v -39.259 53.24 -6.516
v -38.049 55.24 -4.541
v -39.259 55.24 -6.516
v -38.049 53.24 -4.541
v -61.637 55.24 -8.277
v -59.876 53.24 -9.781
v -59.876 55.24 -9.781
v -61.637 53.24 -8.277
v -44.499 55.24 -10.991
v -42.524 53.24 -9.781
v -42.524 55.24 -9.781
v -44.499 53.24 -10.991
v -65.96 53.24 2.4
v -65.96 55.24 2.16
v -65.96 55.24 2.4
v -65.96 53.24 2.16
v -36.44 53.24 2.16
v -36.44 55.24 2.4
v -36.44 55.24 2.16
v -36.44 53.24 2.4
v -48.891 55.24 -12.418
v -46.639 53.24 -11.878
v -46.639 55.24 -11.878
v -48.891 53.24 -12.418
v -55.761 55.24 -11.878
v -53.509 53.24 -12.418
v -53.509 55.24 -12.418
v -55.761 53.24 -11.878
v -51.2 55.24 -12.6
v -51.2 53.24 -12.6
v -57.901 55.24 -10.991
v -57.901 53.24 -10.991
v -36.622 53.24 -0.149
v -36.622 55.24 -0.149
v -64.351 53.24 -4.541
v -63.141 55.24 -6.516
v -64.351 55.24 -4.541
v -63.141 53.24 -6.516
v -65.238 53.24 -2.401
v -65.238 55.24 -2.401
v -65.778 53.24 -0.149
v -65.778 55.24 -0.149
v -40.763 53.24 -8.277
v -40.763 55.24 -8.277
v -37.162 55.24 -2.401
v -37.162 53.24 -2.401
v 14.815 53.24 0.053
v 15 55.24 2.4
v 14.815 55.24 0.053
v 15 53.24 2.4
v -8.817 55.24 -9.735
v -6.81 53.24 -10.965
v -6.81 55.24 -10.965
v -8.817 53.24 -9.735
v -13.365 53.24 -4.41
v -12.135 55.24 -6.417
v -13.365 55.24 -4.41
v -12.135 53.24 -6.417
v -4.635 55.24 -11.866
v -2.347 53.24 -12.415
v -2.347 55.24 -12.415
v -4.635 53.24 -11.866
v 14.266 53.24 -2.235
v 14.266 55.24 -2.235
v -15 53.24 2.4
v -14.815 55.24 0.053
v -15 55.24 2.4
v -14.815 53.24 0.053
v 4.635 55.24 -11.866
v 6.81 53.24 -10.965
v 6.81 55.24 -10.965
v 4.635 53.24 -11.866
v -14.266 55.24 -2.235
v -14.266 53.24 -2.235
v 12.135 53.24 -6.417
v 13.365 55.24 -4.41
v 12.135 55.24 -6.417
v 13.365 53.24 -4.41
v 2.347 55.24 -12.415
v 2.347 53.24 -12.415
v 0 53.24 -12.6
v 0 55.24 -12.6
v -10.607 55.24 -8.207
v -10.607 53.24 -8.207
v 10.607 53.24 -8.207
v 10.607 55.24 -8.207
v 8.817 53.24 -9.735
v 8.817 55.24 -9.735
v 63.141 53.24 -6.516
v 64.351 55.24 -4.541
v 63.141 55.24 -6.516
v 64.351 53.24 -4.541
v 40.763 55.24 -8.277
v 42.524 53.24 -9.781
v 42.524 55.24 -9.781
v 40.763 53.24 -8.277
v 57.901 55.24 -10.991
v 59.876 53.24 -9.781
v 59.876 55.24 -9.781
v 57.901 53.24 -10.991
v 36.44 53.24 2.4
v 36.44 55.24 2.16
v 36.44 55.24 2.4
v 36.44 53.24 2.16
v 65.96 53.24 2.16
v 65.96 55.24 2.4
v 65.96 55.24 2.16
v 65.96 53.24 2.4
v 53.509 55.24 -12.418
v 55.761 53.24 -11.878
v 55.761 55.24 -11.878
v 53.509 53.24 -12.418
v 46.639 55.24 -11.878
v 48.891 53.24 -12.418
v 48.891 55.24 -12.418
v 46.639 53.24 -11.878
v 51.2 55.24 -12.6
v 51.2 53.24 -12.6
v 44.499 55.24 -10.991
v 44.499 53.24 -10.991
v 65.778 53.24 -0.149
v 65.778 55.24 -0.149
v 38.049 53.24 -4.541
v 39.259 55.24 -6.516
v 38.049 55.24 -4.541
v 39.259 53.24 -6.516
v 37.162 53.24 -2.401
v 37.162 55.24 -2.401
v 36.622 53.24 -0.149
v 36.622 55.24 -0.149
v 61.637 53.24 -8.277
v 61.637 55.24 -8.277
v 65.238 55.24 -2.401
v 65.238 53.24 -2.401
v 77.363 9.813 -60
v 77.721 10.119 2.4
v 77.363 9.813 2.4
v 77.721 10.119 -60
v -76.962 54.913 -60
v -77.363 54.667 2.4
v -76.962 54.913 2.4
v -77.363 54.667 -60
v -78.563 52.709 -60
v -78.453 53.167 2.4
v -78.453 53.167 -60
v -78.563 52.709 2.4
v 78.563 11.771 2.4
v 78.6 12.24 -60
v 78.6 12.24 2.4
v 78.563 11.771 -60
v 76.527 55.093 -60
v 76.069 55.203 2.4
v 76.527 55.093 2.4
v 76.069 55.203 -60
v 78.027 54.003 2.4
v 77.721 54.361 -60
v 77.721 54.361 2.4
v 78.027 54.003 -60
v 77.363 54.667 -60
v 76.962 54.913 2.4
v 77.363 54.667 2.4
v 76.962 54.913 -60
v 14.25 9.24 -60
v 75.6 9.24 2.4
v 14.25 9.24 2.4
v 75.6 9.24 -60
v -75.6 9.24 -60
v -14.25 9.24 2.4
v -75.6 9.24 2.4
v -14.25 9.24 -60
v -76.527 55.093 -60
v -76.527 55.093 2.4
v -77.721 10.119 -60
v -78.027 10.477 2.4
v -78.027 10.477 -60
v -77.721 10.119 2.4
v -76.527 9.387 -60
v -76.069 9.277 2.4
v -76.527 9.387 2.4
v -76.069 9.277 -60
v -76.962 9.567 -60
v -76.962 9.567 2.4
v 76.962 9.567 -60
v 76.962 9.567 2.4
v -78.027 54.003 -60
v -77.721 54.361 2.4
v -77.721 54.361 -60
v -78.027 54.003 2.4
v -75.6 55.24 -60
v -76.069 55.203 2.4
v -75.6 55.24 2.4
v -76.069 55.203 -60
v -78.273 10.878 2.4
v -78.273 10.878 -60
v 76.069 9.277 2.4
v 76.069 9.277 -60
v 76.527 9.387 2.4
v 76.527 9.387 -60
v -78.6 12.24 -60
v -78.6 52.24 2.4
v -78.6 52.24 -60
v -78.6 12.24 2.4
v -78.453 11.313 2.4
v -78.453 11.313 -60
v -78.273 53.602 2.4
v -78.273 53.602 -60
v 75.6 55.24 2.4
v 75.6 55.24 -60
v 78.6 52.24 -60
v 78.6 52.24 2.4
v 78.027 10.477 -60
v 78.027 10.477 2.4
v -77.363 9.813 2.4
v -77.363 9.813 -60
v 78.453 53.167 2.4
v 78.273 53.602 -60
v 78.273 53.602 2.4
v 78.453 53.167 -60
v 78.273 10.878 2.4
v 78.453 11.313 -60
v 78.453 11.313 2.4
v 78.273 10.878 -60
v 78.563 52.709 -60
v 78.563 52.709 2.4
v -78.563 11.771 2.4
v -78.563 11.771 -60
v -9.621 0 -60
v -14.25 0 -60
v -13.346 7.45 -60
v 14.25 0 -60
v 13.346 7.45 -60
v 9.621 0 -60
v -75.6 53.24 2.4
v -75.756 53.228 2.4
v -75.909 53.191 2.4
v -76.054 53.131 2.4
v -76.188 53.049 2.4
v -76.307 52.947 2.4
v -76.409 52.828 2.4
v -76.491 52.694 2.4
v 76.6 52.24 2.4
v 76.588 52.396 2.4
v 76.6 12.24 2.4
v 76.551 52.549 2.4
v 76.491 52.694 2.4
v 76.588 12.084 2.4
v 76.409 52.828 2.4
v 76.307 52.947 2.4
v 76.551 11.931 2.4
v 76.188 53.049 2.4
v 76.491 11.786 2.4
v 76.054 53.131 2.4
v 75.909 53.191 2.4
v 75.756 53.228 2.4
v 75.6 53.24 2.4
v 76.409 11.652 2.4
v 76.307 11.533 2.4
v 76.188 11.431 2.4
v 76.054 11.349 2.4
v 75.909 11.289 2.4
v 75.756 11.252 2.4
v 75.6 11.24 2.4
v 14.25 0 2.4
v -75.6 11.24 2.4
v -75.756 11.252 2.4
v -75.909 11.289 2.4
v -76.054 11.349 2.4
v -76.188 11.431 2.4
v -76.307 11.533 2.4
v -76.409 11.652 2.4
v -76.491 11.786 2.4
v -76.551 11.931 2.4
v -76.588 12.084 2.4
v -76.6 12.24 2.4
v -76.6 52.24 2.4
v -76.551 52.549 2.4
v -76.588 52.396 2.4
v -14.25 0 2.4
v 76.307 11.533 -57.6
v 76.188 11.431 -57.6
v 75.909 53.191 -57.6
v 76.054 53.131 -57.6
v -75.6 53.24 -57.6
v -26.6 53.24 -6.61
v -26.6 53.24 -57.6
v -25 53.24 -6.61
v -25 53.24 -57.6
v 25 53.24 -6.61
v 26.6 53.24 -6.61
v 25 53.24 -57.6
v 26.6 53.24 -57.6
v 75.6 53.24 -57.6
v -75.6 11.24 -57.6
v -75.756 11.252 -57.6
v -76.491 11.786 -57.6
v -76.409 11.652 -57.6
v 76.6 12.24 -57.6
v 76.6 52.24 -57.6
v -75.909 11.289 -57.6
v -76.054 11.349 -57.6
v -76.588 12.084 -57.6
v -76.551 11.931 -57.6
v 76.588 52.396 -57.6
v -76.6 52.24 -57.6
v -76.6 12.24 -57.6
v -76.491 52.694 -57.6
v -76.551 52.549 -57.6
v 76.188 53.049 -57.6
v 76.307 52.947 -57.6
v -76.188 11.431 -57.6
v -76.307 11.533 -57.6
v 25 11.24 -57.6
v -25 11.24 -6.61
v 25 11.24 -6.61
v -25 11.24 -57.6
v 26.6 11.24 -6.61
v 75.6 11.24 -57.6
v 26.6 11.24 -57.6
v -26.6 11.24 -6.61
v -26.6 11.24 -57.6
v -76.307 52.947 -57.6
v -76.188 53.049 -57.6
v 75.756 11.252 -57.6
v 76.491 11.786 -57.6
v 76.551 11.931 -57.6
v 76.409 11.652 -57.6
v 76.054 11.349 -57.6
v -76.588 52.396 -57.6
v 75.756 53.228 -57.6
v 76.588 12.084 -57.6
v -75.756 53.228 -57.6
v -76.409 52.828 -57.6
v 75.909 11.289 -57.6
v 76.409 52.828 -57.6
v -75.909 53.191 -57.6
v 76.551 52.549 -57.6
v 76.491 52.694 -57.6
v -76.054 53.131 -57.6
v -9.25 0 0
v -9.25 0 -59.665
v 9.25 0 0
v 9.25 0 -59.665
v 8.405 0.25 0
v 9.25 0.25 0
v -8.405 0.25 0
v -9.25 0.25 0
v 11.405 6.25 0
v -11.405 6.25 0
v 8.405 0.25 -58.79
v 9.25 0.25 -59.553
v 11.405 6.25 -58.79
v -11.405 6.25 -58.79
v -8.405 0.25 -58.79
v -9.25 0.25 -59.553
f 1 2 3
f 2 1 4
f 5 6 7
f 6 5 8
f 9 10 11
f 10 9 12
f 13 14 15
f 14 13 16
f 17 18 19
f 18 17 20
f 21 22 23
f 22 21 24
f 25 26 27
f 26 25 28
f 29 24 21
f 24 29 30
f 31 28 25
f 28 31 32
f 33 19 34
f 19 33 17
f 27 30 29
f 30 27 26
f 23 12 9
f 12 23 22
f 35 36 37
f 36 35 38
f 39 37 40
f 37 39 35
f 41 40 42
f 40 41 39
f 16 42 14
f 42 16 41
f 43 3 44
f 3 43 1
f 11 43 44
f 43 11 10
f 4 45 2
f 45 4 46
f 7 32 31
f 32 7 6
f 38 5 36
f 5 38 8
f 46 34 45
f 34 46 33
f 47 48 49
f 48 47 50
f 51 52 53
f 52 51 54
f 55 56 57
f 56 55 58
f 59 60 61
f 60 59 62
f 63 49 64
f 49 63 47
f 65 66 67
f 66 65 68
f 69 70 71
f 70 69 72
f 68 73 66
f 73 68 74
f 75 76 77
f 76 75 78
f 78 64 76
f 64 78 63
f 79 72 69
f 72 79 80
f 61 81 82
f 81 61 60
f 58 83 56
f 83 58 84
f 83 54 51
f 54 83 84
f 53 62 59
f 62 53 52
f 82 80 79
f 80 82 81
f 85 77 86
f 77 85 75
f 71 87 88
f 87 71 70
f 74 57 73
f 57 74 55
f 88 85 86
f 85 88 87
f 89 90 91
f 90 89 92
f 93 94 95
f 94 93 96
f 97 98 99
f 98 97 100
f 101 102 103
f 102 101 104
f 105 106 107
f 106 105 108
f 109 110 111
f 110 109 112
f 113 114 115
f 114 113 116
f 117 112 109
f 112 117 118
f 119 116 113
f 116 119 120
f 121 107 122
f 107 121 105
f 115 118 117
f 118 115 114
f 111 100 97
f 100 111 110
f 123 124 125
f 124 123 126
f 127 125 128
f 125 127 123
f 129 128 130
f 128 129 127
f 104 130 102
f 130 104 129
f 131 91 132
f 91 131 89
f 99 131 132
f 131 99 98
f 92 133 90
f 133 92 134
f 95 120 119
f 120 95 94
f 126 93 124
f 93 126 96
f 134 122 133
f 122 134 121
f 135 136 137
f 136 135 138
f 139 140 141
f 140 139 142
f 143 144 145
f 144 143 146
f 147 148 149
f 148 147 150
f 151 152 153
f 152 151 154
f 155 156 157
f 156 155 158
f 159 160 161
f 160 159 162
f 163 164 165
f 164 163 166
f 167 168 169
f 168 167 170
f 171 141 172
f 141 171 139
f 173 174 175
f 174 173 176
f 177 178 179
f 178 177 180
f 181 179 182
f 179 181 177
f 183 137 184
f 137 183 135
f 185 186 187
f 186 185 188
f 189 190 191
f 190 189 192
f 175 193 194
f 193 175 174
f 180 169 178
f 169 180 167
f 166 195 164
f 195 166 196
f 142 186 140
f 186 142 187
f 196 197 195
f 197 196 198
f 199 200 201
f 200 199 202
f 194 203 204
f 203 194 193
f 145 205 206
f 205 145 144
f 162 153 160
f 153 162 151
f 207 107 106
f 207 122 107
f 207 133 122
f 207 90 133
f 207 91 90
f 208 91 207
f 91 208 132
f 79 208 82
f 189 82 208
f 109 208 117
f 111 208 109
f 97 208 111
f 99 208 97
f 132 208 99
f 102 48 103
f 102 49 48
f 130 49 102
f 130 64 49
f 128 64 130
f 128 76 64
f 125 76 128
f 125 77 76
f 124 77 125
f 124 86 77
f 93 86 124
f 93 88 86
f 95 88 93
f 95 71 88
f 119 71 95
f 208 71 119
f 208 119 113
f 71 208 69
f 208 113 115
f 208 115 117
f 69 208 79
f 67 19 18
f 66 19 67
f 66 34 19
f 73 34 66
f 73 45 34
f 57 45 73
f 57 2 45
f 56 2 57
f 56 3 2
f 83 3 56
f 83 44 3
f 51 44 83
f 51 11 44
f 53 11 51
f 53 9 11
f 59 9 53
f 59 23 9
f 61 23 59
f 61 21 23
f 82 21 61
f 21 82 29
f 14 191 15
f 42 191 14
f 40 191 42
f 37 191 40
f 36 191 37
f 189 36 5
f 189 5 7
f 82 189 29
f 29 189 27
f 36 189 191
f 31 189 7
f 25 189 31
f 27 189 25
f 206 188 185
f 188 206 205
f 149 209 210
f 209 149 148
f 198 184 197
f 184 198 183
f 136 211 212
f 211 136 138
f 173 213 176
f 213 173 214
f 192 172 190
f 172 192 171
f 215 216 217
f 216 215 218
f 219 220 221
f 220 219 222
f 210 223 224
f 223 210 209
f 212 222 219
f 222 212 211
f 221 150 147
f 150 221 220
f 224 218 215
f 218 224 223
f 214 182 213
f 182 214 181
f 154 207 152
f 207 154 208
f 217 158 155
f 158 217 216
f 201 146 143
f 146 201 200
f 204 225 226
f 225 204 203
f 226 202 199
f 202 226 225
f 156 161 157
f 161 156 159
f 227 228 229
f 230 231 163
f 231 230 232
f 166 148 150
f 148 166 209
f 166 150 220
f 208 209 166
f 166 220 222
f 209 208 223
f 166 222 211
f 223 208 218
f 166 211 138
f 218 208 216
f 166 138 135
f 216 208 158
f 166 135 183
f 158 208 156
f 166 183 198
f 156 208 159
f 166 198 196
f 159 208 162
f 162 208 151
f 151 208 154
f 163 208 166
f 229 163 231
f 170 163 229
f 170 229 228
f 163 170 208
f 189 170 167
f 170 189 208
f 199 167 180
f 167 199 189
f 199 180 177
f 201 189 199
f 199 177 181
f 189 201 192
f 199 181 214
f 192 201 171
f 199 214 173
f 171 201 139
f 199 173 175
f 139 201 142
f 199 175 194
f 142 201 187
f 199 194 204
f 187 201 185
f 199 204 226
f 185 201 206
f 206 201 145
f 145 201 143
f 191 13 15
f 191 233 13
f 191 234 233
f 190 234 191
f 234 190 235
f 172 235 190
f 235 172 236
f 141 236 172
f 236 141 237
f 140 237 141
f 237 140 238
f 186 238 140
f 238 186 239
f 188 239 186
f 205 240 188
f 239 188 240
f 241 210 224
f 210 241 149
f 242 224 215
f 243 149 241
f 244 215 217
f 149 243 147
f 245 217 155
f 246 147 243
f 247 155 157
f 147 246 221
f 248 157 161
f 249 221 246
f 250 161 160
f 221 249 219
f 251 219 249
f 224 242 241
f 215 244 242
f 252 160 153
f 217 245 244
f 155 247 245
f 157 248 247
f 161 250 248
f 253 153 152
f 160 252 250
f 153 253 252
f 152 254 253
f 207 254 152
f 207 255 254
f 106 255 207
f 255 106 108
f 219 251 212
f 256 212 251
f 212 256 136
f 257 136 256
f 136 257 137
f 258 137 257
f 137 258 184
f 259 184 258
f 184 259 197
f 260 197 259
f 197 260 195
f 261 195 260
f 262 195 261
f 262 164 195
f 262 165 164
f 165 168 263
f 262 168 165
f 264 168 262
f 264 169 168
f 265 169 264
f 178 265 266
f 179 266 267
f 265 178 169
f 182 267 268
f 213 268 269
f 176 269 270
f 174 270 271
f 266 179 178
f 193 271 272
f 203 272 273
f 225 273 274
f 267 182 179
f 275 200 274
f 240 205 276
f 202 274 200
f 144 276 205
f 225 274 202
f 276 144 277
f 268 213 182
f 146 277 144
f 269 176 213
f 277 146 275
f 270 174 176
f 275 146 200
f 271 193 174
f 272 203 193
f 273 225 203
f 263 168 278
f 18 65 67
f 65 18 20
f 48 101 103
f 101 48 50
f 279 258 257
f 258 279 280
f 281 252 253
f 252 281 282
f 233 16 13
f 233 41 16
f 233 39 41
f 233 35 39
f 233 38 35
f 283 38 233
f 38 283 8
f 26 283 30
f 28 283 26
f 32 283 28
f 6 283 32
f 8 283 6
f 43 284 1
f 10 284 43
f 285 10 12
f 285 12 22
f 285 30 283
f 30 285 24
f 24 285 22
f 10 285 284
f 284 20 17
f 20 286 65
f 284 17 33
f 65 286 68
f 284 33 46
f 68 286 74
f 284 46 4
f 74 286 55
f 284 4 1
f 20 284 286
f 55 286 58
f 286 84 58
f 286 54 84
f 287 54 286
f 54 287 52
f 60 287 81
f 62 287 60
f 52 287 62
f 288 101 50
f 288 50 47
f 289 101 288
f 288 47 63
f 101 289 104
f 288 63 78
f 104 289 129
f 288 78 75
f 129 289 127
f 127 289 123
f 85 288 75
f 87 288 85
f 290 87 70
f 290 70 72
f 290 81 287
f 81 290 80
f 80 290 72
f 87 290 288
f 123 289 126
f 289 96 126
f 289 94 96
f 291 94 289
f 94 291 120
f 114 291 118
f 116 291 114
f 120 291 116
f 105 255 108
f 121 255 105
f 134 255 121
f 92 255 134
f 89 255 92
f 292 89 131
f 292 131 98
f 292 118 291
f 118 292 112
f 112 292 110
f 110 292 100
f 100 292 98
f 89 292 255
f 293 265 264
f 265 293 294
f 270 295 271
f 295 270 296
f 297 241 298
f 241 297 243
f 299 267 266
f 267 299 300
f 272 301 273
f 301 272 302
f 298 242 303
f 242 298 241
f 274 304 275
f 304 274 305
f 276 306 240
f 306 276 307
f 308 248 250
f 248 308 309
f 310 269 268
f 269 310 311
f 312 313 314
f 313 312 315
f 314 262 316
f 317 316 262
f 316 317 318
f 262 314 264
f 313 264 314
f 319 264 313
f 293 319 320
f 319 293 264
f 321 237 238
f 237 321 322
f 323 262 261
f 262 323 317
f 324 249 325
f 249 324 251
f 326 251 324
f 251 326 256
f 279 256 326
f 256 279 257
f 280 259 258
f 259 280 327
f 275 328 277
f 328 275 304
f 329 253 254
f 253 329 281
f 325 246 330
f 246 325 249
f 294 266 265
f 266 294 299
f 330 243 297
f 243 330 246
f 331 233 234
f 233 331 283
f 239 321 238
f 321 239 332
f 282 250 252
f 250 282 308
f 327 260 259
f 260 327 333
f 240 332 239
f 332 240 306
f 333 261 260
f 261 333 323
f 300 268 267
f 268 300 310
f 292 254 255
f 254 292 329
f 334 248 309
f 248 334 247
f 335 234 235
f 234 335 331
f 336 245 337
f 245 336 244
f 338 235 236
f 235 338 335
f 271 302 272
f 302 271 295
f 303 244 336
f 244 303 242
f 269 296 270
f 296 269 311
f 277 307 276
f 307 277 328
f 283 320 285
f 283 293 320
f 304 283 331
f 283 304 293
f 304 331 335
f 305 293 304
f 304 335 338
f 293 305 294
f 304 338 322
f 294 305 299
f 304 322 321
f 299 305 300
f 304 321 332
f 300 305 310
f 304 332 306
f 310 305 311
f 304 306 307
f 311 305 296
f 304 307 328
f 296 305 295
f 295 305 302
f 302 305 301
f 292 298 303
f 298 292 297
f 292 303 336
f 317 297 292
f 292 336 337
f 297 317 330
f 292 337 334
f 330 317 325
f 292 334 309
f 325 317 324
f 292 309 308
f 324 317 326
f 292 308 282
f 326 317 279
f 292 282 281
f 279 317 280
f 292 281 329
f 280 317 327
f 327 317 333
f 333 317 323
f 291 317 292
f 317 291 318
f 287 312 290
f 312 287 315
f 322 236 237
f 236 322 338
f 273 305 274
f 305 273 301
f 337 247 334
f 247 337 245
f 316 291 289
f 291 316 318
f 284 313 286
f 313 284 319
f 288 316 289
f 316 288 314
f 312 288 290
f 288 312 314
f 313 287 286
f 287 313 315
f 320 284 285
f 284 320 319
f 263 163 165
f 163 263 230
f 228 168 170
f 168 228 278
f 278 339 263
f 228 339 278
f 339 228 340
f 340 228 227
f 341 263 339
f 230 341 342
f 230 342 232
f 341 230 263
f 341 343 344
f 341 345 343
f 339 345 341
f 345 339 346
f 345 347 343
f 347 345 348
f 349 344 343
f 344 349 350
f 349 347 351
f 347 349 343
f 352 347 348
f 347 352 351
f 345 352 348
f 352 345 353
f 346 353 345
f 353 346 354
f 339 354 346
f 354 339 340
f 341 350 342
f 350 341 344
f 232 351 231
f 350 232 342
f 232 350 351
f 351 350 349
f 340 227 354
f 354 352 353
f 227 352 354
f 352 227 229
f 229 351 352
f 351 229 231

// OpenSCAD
// file: rail-clip.scad
// Bunk rail system, shared library.
//
// A rail clip hooks over a bed's top guardrail rail. Its plate carries a
// vertical dovetail tail; every accessory (cup, tissue box, cubby, and
// later a wardrobe rod or hooks) has a matching socket on its back. The
// socket is open at the bottom and capped by a roof at the top: you lower
// the accessory from above, the tail enters through the socket's bottom
// mouth, and the roof comes down onto the tail's top end. Weight and a
// dropped cup push the roof harder onto the tail, so a load can't slide
// the accessory off; only lifting it does. Wide accessories take two or
// more clips.
//
// (Before 2026-11-12 the stop was a floor at the socket's bottom, which
// meant the accessory went on by being pushed UP and any downward load
// slid it off. pipeline/print-check's retention check now fails that.)
//
// Defaults are the owner's caliper readings (2026-11-08) of a Bellemave
// twin low loft (FST00301-TB-AH): top rail 20.74 front-to-back x 20.38
// tall, lower rails about 15.5 tall x 20.18, 80.54 from the top rail's
// bottom to the next rail's top. The owner reports the rails are 80 apart
// all the way down.
//
// Clip axes: X runs along the rail, Y points away from the rail toward
// the accessory, Z is up. The top rail's bottom face is z = 0 and its
// accessory-side face is y = 0. Inside or outside the bed is the same
// part turned the other way round.
//
// Accessory axes: X along the rail, Y away from the clip, Z up. The
// accessory's back face is y = 0 and the underside of the socket roof
// (where the tail's top end bears) is z = 0. The roof is z = 0 to
// dt_roof(); the accessory hangs below.

// ---- dovetail interface (keep these fixed so all parts interchange) ----
function dt_base() = 16;    // tail width at the plate
function dt_tip() = 22;     // tail width at its face
function dt_depth() = 6;    // how far the tail stands off the plate
function dt_wall() = 3;     // accessory material around the socket
function dt_roof() = 2.4;   // socket roof over the tail's top end; carries the load
function dt_block_w(c) = dt_tip() + 2 * c + 2 * dt_wall();
function dt_block_d(c) = dt_depth() + c + dt_wall();

module dt_profile() {
  polygon([[-dt_base() / 2, 0], [dt_base() / 2, 0],
           [dt_tip() / 2, dt_depth()], [-dt_tip() / 2, dt_depth()]]);
}

// male tail on the clip, standing on y = 0, from z0 to z1
module dt_tail(z0, z1) {
  translate([0, 0, z0]) linear_extrude(z1 - z0) dt_profile();
}

// socket cut, clearance c on every mating face, open through y < 0
module dt_socket(z0, z1, c) {
  translate([0, 0, z0]) linear_extrude(z1 - z0) union() {
    offset(delta = c) dt_profile();
    translate([-dt_base() / 2 - c - 1, -1]) square([dt_base() + 2 * c + 2, 1 + c]);
  }
}

// Give an accessory its mount block(s) and socket(s). Children are the
// accessory body, starting at y = dt_block_d(c). The block runs from
// z = -h up to the roof's top (dt_roof()); its socket is open at the
// bottom and stops at the roof. h is how much tail the socket takes; a
// longer tail just shows below the block. xs are the socket centers along
// X (a clip each).
module with_mounts(h, c = 0.25, xs = [0]) {
  bw = dt_block_w(c);
  bd = dt_block_d(c);
  assert(h >= 30, str("with_mounts: only ", h, " mm of tail engaged; 30 is the minimum"));
  difference() {
    union() {
      children();
      for (x = xs) translate([x - bw / 2, 0, -h]) cube([bw, bd + 0.01, h + dt_roof()]);
    }
    for (x = xs) translate([x, 0, 0]) dt_socket(-h - 1, 0, c);
    // 45 deg lead-in chamfer at each socket's bottom mouth
    for (x = xs) translate([x, 0, 0]) hull() {
      translate([0, 0, -h - 0.01]) linear_extrude(0.01) offset(delta = c + 1.2) dt_profile();
      translate([0, 0, -h + 1.2]) linear_extrude(0.01) offset(delta = c) dt_profile();
    }
  }
}

// ---- clip ----
function clip_top(rail_h = 20.38, wall = 3) = rail_h + wall;
function clip_foot(rail_gap = 80.54, brace = 7.5) = -(rail_gap + brace);
function clip_mount_y(clear = 0.4, wall = 3) = clear / 2 + wall;

module rail_clip(rail_d = 20.74, rail_h = 20.38, rail_gap = 80.54,
                 hook_w = 40, wall = 3, leg_t = 2.5, lip = 1.0, lip_h = 2.5,
                 brace = 7.5, clear = 0.4, eps = 0.01,
                 catch = "none", low_h = 15.42, low_d = 15.42, low_set = 2.47, pad_clear = 0.3,
                 catch_clear = 0.6, catch_reach = 1.5, catch_t = 2.5,
                 nub_h = 2, nub_t = 2.5, wrap = false, min_tail = 34) {
  // The clip hangs from one rail (rail_d x rail_h) and catches the next one
  // down (low_d x low_h, rail_gap below, its near face low_set behind this
  // rail's; negative low_set = in front of it). wrap = true: a clip for a
  // single bar; the J catches under the same bar it hangs from, and a short
  // far lip replaces the far leg so it rocks on.
  g  = wrap ? -rail_h : rail_gap;
  lh = wrap ? rail_h : low_h;
  ld = wrap ? rail_d : low_d;
  ls = wrap ? 0 : low_set;
  top_z = clip_top(rail_h, wall);
  foot_z = clip_foot(g, brace);
  near_y = clear / 2;
  far_y = -(rail_d + clear / 2);
  low_face = -ls;                                // next rail's near face
  // the plate stands off whichever face sticks out further
  plate_y = wrap ? near_y : max(near_y, low_face + pad_clear);
  // catch = "hook": a lip snaps under the next rail's near edge; flat top
  // face holds, 45 deg ramp underneath so the plate flexes over the rails.
  // Printed saddle-down the flat face is a ledge over air of about
  // catch_reach (1.5 = owner's pick, 2026-11-16).
  catch_z = -(g + lh) - catch_clear;             // underside of the next rail, plus play
  tip_y = low_face - catch_reach;
  ramp = plate_y - tip_y;
  // catch = "j" (owner's pick, 2026-11-18): a shelf runs right under the
  // next rail, across its full depth, and a nub_h nub turns up behind its
  // far face. It goes on by hooking under first and rocking up over the
  // hanging rail. Printed saddle-down, shelf and nub need supports.
  j_far = low_face - ld - catch_clear;           // shelf's far end, behind the next rail
  catch_bot = catch == "hook" ? catch_z - catch_t - ramp
            : catch == "j" ? catch_z - catch_t - 4 : foot_z;
  // long enough for an accessory's 30 mm of socket, whatever the catch
  plate_z = min(catch_bot, top_z - min_tail);
  assert(catch == "none" || catch == "hook" || catch == "j", str("rail_clip: unknown catch ", catch));
  assert(!wrap || catch == "j", "rail_clip: a single-bar clip (wrap) needs catch = \"j\"");
  // spacer between the plate and this rail's face, when the next rail sticks out further
  if (plate_y > near_y + 0.2) translate([-hook_w / 2, near_y - eps, 0]) cube([hook_w, plate_y - near_y + 2 * eps, rail_h + eps]);
  // pad on the plate's inside that rests on the next rail's face (pad_clear
  // play) when that rail sits behind this one. 45 deg ends.
  pad = plate_y - (low_face + pad_clear);
  if (!wrap && pad > 0.2) translate([hook_w / 2, 0, 0]) rotate([0, -90, 0]) linear_extrude(hook_w)
    // with a catch the pad runs on down into it (no notch for a ledge to hang off)
    let(pb = catch == "none" ? max(-(g + lh), plate_z + pad) : catch_z - eps)
    polygon([[-g + pad, plate_y + eps], [-g, plate_y - pad], [pb, plate_y - pad],
             catch == "none" ? [pb - pad, plate_y + eps] : [pb, plate_y + eps]]);
  translate([-hook_w / 2, plate_y, plate_z]) cube([hook_w, wall, top_z - plate_z]);
  if (catch == "hook") translate([hook_w / 2, 0, 0]) rotate([0, -90, 0]) linear_extrude(hook_w)
    polygon([[catch_z, plate_y + eps], [catch_z, tip_y], [catch_z - catch_t, tip_y],
             [catch_z - catch_t - ramp, plate_y + eps]]);
  if (catch == "j") translate([hook_w / 2, 0, 0]) rotate([0, -90, 0]) linear_extrude(hook_w) union() {
    // shelf under the next rail, from the plate to behind its far face
    polygon([[catch_z, plate_y + eps], [catch_z, j_far - nub_t],
             [catch_z - catch_t, j_far - nub_t], [catch_z - catch_t, plate_y + eps]]);
    // nub up behind the far face, 45 deg lead-in on its outer top edge
    polygon([[catch_z - eps, j_far], [catch_z + nub_h, j_far],
             [catch_z + nub_h, j_far - nub_t + min(nub_h, nub_t) / 2], [catch_z + nub_h - min(nub_h, nub_t) / 2, j_far - nub_t],
             [catch_z - eps, j_far - nub_t]]);
    // 45 deg gusset under the shelf where it meets the plate
    polygon([[catch_z - catch_t + eps, plate_y + eps], [catch_z - catch_t + eps, plate_y - 4],
             [catch_z - catch_t - 4, plate_y + eps]]);
  }
  // saddle across the rail top
  translate([-hook_w / 2, far_y - leg_t, rail_h])
    cube([hook_w, plate_y - far_y + wall + leg_t, wall]);
  if (wrap) {
    // short far lip over the bar's far top edge (the J holds the bottom)
    translate([-hook_w / 2, far_y - leg_t, rail_h - nub_h - 1]) cube([hook_w, leg_t, nub_h + 1 + eps]);
  } else {
    // far leg down the rail's far face
    translate([-hook_w / 2, far_y - leg_t, -lip_h]) cube([hook_w, leg_t, rail_h + lip_h + eps]);
    // snap lip under the rail's far edge, lead-in chamfer on its lower face
    translate([hook_w / 2, far_y, -lip_h]) rotate([0, -90, 0]) linear_extrude(hook_w)
      polygon([[0, 0], [lip_h, 0], [lip_h, lip], [lip_h - lip, lip]]);
  }
  // dovetail tail on the plate's outer face, to the plate's bottom so a
  // catch has no thin neck (accessories just leave it showing below)
  translate([0, plate_y + wall - eps, 0]) dt_tail(plate_z, top_z);
}

// place an accessory (in accessory axes) on a default clip at x
module on_clip(x = 0, clear = 0.4, wall = 3, rail_h = 20.38) {
  translate([x, clip_mount_y(clear, wall), clip_top(rail_h, wall)])
    children();
}

// the bed's rails, for renders only (accessory side is +Y)
// next rail: 15.42 square, its near face 2.47 behind the top rail's (owner's calipers, 2026-11-16)
module rail_ghost(rail_d = 20.74, rail_h = 20.38, rail_gap = 80.54, low_d = 15.42, low_h = 15.42, low_set = 2.47) {
  color("pink", 0.5) {
    translate([-200, -rail_d, 0]) cube([400, rail_d, rail_h]);
    translate([-200, -low_set - low_d, -rail_gap - low_h]) cube([400, low_d, low_h]);
  }
}

// assembly preview: rails, clips at xs, accessory. The clip is the same
// part inside or outside the bed; it just goes on the other way round.
module bunk_assembly(xs = [0]) {
  rail_ghost();
  for (x = xs) color("orchid") translate([x, 0, 0]) rail_clip();
  color("plum") on_clip() children();
}

// pieces of the assembly one at a time, for the print-check tool
module bunk_piece(which, xs = [0]) {
  if (which == "rails") rail_ghost();
  else if (which == "clips") for (x = xs) translate([x, 0, 0]) rail_clip();
  else if (which == "mounted") on_clip() children();
}
// main file
// Bunk storage tray: an open-top rectangular tray with compartments that
// hangs on rail clips (clip.scad), lowered on from above. Remotes, glasses,
// books, toys: pick a size preset, or set "custom" and give every column
// width and row depth yourself.
//
//   small: 3 compartments in a row, 1 clip
//   large: 3 x 2 = 6 compartments, 2 clips
//
// Each compartment is sized for a TV remote standing up (most are about
// 40-50 mm wide and 20-25 mm thick). Columns run along the rail; rows run
// away from it, row 1 nearest the rail.
//
// Layout style:
//   grid:    even columns x rows (col_w / row_d)
//   feature: one big middle compartment with small ones at the sides
//            (small: narrow | wide | narrow; large: big middle, 2 small
//            stacked each side)
//   lines:   draw your own. Each line is one divider wall, [x1, y1, x2, y2]
//            in mm on the tray's inside floor, as seen standing in the room
//            facing the bed: x from the left wall (0) to the right wall, y from the rail-side wall (0) to the front
//            wall. Lines run straight across (x1 == x2 or y1 == y2), and
//            each end must land on a wall or on another line, like drawing
//            wall to wall. This is what the shop's draw-your-own editor sends.
//
// Print upright as modeled, no supports: the floor sits on the bed and the
// finger scoops are open at the top.

use <rail-clip.scad>

size = "small"; // [small, large, custom]
style = "grid";  // [grid, feature, lines]
lines = [[60, 0, 60, 40], [0, 20, 60, 20]]; // style = lines: [x1, y1, x2, y2] in mm

/* [Custom compartments (size = custom)] */
col_w = [50, 50, 50]; // each column's inside width, along the rail
row_d = [42];         // each row's inside depth, away from the rail
height = 60;          // wall height above the floor
clips = 1;            // 1 or 2 rail clips
clip_pitch = 120;     // clip spacing when using 2; must miss the bed's posts

/* [Build] */
wall = 2;
divider = 1.6;        // divider thickness
divider_frac = 0.85;  // divider height as a fraction of the wall height
floor_t = 2.4;
corner_r = 3;
scoop = 15;           // finger dip in the front wall of each column (0 for none)
scoop_frac = 0.6;     // dip width as a fraction of the column width

/* [Fit] */
dt_clear = 0.25;

part = "tray"; // [tray, assembly, rails, clips, mounted]

/* [Hidden] */
$fn = 40;
eps = 0.01;

P = size == "small" ? [[50, 50, 50], [42], 60, 1, 120]
  : size == "large" ? [[55, 55, 55], [38, 38], 70, 2, 120]
  : [col_w, row_d, height, clips, clip_pitch];
cw = P[0]; rd = P[1]; ht = P[2]; nclips = P[3]; pitch = P[4];

function sum(v, n) = n <= 0 ? 0 : v[n - 1] + sum(v, n - 1);

assert(len(cw) >= 1 && len(rd) >= 1, "need at least one column and one row");
for (w = cw) assert(w >= 15, str("column width ", w, " is under 15 mm"));
for (d = rd) assert(d >= 15, str("row depth ", d, " is under 15 mm"));
assert(scoop < ht - 15, "scoop must leave at least 15 mm of front wall");

iw = sum(cw, len(cw)) + (len(cw) - 1) * divider;  // inside width
id = sum(rd, len(rd)) + (len(rd) - 1) * divider;  // inside depth
ow = iw + 2 * wall;
od = id + 2 * wall;
oh = floor_t + ht;
y0 = dt_block_d(dt_clear) - eps;
bot = dt_roof() - oh;  // rim flush with the socket roof
xs = nclips >= 2 ? [-pitch / 2, pitch / 2] : [0];
dh = ht * divider_frac;

// ---- dividers as lines (centerlines, inside-floor mm) ----
function cumsum(v, i) = i <= 0 ? 0 : v[i - 1] + cumsum(v, i - 1);
grid_lines = concat(
  [for (i = [1 : len(cw) - 1]) let(x = cumsum(cw, i) + (i - 0.5) * divider) [x, 0, x, id]],
  len(rd) > 1 ? [for (j = [1 : len(rd) - 1]) let(y = cumsum(rd, j) + (j - 0.5) * divider) [0, y, iw, y]] : []);
fs = len(rd) > 1;  // large-style: stack the side cells
side = min(48, iw * 0.28);
feature_lines = concat([[side, 0, side, id], [iw - side, 0, iw - side, id]],
  fs ? [[0, id / 2, side, id / 2], [iw - side, id / 2, iw, id / 2]] : []);
L = style == "grid" ? grid_lines : style == "feature" ? feature_lines : lines;

E = 0.01;
function on_seg(p, l) =  // point p on line l (within E)
  l[0] == l[2] ? (abs(p[0] - l[0]) < E + divider / 2 && p[1] >= min(l[1], l[3]) - E && p[1] <= max(l[1], l[3]) + E)
               : (abs(p[1] - l[1]) < E + divider / 2 && p[0] >= min(l[0], l[2]) - E && p[0] <= max(l[0], l[2]) + E);
function on_wall(p) = abs(p[0]) < E || abs(p[0] - iw) < E || abs(p[1]) < E || abs(p[1] - id) < E;
function anchored(p, k) = on_wall(p) || len([for (m = [0 : len(L) - 1]) if (m != k && on_seg(p, L[m])) 1]) > 0;

for (k = [0 : len(L) - 1]) let(l = L[k]) {
  assert(len(l) == 4, str("line ", k, " needs [x1, y1, x2, y2]"));
  assert(l[0] == l[2] || l[1] == l[3], str("line ", k, " must run straight across (x1 == x2 or y1 == y2)"));
  assert(min(l[0], l[2]) >= -E && max(l[0], l[2]) <= iw + E && min(l[1], l[3]) >= -E && max(l[1], l[3]) <= id + E,
         str("line ", k, " leaves the tray (inside is ", iw, " x ", id, " mm)"));
  assert(anchored([l[0], l[1]], k) && anchored([l[2], l[3]], k),
         str("line ", k, " must start and end on a wall or another line"));
}

// front-wall compartments: split the front wall at every line that reaches it
function qsort(v) = len(v) <= 1 ? v : let(p = v[0])
  concat(qsort([for (x = v) if (x < p) x]), [for (x = v) if (x == p) x], qsort([for (x = v) if (x > p) x]));
// model axes: the room-side viewer's left is +X, so flip x
G = [for (l = L) [iw - l[0], l[1], iw - l[2], l[3]]];
front_x = qsort(concat([0, iw], [for (l = G) if (l[0] == l[2] && max(l[1], l[3]) >= id - E) l[0]]));

echo(str("storage tray ", size, " / ", style, ": ", len(L), " dividers, inside ", iw, " x ", id,
         ", outside ", ow, " x ", od, " x ", oh, " mm, clips ", nclips));

module rbox(w, d, h, r) {
  hull() for (x = [r, w - r], y = [r, d - r]) translate([x, y, 0]) cylinder(r = r, h = h);
}

module body() {
  difference() {
    translate([-ow / 2, y0, bot]) rbox(ow, od, oh, corner_r);
    translate([-iw / 2, y0 + wall, bot + floor_t]) rbox(iw, id, oh, max(0.5, corner_r - wall));
    if (scoop > 0)
      for (i = [0 : len(front_x) - 2]) let(a = front_x[i], b = front_x[i + 1], cwid = b - a - divider)
        if (cwid >= 15) let(sw = cwid * scoop_frac)
          // round-bottomed dip in the front wall, open at the top
          translate([-iw / 2 + (a + b) / 2, y0 + od + 1, bot + oh - scoop + sw / 2]) rotate([90, 0, 0])
            hull() { cylinder(d = sw, h = wall + 2); translate([-sw / 2, 0, 0]) cube([sw, scoop + 1, wall + 2]); }
  }
  // dividers: each line widened by the divider thickness, clipped to the inside
  intersection() {
    translate([-iw / 2 - E, y0 + wall - E, bot + floor_t - E]) cube([iw + 2 * E, id + 2 * E, dh]);
    for (l = G)
      translate([-iw / 2 + min(l[0], l[2]) - divider / 2, y0 + wall + min(l[1], l[3]) - divider / 2, bot + floor_t - E])
        cube([abs(l[2] - l[0]) + divider, abs(l[3] - l[1]) + divider, dh]);
  }
}

module tray() { with_mounts(-bot, dt_clear, xs) body(); }

if (part == "assembly") bunk_assembly(xs) tray();
else if (part == "tray") tray();
else bunk_piece(part, xs) tray();
